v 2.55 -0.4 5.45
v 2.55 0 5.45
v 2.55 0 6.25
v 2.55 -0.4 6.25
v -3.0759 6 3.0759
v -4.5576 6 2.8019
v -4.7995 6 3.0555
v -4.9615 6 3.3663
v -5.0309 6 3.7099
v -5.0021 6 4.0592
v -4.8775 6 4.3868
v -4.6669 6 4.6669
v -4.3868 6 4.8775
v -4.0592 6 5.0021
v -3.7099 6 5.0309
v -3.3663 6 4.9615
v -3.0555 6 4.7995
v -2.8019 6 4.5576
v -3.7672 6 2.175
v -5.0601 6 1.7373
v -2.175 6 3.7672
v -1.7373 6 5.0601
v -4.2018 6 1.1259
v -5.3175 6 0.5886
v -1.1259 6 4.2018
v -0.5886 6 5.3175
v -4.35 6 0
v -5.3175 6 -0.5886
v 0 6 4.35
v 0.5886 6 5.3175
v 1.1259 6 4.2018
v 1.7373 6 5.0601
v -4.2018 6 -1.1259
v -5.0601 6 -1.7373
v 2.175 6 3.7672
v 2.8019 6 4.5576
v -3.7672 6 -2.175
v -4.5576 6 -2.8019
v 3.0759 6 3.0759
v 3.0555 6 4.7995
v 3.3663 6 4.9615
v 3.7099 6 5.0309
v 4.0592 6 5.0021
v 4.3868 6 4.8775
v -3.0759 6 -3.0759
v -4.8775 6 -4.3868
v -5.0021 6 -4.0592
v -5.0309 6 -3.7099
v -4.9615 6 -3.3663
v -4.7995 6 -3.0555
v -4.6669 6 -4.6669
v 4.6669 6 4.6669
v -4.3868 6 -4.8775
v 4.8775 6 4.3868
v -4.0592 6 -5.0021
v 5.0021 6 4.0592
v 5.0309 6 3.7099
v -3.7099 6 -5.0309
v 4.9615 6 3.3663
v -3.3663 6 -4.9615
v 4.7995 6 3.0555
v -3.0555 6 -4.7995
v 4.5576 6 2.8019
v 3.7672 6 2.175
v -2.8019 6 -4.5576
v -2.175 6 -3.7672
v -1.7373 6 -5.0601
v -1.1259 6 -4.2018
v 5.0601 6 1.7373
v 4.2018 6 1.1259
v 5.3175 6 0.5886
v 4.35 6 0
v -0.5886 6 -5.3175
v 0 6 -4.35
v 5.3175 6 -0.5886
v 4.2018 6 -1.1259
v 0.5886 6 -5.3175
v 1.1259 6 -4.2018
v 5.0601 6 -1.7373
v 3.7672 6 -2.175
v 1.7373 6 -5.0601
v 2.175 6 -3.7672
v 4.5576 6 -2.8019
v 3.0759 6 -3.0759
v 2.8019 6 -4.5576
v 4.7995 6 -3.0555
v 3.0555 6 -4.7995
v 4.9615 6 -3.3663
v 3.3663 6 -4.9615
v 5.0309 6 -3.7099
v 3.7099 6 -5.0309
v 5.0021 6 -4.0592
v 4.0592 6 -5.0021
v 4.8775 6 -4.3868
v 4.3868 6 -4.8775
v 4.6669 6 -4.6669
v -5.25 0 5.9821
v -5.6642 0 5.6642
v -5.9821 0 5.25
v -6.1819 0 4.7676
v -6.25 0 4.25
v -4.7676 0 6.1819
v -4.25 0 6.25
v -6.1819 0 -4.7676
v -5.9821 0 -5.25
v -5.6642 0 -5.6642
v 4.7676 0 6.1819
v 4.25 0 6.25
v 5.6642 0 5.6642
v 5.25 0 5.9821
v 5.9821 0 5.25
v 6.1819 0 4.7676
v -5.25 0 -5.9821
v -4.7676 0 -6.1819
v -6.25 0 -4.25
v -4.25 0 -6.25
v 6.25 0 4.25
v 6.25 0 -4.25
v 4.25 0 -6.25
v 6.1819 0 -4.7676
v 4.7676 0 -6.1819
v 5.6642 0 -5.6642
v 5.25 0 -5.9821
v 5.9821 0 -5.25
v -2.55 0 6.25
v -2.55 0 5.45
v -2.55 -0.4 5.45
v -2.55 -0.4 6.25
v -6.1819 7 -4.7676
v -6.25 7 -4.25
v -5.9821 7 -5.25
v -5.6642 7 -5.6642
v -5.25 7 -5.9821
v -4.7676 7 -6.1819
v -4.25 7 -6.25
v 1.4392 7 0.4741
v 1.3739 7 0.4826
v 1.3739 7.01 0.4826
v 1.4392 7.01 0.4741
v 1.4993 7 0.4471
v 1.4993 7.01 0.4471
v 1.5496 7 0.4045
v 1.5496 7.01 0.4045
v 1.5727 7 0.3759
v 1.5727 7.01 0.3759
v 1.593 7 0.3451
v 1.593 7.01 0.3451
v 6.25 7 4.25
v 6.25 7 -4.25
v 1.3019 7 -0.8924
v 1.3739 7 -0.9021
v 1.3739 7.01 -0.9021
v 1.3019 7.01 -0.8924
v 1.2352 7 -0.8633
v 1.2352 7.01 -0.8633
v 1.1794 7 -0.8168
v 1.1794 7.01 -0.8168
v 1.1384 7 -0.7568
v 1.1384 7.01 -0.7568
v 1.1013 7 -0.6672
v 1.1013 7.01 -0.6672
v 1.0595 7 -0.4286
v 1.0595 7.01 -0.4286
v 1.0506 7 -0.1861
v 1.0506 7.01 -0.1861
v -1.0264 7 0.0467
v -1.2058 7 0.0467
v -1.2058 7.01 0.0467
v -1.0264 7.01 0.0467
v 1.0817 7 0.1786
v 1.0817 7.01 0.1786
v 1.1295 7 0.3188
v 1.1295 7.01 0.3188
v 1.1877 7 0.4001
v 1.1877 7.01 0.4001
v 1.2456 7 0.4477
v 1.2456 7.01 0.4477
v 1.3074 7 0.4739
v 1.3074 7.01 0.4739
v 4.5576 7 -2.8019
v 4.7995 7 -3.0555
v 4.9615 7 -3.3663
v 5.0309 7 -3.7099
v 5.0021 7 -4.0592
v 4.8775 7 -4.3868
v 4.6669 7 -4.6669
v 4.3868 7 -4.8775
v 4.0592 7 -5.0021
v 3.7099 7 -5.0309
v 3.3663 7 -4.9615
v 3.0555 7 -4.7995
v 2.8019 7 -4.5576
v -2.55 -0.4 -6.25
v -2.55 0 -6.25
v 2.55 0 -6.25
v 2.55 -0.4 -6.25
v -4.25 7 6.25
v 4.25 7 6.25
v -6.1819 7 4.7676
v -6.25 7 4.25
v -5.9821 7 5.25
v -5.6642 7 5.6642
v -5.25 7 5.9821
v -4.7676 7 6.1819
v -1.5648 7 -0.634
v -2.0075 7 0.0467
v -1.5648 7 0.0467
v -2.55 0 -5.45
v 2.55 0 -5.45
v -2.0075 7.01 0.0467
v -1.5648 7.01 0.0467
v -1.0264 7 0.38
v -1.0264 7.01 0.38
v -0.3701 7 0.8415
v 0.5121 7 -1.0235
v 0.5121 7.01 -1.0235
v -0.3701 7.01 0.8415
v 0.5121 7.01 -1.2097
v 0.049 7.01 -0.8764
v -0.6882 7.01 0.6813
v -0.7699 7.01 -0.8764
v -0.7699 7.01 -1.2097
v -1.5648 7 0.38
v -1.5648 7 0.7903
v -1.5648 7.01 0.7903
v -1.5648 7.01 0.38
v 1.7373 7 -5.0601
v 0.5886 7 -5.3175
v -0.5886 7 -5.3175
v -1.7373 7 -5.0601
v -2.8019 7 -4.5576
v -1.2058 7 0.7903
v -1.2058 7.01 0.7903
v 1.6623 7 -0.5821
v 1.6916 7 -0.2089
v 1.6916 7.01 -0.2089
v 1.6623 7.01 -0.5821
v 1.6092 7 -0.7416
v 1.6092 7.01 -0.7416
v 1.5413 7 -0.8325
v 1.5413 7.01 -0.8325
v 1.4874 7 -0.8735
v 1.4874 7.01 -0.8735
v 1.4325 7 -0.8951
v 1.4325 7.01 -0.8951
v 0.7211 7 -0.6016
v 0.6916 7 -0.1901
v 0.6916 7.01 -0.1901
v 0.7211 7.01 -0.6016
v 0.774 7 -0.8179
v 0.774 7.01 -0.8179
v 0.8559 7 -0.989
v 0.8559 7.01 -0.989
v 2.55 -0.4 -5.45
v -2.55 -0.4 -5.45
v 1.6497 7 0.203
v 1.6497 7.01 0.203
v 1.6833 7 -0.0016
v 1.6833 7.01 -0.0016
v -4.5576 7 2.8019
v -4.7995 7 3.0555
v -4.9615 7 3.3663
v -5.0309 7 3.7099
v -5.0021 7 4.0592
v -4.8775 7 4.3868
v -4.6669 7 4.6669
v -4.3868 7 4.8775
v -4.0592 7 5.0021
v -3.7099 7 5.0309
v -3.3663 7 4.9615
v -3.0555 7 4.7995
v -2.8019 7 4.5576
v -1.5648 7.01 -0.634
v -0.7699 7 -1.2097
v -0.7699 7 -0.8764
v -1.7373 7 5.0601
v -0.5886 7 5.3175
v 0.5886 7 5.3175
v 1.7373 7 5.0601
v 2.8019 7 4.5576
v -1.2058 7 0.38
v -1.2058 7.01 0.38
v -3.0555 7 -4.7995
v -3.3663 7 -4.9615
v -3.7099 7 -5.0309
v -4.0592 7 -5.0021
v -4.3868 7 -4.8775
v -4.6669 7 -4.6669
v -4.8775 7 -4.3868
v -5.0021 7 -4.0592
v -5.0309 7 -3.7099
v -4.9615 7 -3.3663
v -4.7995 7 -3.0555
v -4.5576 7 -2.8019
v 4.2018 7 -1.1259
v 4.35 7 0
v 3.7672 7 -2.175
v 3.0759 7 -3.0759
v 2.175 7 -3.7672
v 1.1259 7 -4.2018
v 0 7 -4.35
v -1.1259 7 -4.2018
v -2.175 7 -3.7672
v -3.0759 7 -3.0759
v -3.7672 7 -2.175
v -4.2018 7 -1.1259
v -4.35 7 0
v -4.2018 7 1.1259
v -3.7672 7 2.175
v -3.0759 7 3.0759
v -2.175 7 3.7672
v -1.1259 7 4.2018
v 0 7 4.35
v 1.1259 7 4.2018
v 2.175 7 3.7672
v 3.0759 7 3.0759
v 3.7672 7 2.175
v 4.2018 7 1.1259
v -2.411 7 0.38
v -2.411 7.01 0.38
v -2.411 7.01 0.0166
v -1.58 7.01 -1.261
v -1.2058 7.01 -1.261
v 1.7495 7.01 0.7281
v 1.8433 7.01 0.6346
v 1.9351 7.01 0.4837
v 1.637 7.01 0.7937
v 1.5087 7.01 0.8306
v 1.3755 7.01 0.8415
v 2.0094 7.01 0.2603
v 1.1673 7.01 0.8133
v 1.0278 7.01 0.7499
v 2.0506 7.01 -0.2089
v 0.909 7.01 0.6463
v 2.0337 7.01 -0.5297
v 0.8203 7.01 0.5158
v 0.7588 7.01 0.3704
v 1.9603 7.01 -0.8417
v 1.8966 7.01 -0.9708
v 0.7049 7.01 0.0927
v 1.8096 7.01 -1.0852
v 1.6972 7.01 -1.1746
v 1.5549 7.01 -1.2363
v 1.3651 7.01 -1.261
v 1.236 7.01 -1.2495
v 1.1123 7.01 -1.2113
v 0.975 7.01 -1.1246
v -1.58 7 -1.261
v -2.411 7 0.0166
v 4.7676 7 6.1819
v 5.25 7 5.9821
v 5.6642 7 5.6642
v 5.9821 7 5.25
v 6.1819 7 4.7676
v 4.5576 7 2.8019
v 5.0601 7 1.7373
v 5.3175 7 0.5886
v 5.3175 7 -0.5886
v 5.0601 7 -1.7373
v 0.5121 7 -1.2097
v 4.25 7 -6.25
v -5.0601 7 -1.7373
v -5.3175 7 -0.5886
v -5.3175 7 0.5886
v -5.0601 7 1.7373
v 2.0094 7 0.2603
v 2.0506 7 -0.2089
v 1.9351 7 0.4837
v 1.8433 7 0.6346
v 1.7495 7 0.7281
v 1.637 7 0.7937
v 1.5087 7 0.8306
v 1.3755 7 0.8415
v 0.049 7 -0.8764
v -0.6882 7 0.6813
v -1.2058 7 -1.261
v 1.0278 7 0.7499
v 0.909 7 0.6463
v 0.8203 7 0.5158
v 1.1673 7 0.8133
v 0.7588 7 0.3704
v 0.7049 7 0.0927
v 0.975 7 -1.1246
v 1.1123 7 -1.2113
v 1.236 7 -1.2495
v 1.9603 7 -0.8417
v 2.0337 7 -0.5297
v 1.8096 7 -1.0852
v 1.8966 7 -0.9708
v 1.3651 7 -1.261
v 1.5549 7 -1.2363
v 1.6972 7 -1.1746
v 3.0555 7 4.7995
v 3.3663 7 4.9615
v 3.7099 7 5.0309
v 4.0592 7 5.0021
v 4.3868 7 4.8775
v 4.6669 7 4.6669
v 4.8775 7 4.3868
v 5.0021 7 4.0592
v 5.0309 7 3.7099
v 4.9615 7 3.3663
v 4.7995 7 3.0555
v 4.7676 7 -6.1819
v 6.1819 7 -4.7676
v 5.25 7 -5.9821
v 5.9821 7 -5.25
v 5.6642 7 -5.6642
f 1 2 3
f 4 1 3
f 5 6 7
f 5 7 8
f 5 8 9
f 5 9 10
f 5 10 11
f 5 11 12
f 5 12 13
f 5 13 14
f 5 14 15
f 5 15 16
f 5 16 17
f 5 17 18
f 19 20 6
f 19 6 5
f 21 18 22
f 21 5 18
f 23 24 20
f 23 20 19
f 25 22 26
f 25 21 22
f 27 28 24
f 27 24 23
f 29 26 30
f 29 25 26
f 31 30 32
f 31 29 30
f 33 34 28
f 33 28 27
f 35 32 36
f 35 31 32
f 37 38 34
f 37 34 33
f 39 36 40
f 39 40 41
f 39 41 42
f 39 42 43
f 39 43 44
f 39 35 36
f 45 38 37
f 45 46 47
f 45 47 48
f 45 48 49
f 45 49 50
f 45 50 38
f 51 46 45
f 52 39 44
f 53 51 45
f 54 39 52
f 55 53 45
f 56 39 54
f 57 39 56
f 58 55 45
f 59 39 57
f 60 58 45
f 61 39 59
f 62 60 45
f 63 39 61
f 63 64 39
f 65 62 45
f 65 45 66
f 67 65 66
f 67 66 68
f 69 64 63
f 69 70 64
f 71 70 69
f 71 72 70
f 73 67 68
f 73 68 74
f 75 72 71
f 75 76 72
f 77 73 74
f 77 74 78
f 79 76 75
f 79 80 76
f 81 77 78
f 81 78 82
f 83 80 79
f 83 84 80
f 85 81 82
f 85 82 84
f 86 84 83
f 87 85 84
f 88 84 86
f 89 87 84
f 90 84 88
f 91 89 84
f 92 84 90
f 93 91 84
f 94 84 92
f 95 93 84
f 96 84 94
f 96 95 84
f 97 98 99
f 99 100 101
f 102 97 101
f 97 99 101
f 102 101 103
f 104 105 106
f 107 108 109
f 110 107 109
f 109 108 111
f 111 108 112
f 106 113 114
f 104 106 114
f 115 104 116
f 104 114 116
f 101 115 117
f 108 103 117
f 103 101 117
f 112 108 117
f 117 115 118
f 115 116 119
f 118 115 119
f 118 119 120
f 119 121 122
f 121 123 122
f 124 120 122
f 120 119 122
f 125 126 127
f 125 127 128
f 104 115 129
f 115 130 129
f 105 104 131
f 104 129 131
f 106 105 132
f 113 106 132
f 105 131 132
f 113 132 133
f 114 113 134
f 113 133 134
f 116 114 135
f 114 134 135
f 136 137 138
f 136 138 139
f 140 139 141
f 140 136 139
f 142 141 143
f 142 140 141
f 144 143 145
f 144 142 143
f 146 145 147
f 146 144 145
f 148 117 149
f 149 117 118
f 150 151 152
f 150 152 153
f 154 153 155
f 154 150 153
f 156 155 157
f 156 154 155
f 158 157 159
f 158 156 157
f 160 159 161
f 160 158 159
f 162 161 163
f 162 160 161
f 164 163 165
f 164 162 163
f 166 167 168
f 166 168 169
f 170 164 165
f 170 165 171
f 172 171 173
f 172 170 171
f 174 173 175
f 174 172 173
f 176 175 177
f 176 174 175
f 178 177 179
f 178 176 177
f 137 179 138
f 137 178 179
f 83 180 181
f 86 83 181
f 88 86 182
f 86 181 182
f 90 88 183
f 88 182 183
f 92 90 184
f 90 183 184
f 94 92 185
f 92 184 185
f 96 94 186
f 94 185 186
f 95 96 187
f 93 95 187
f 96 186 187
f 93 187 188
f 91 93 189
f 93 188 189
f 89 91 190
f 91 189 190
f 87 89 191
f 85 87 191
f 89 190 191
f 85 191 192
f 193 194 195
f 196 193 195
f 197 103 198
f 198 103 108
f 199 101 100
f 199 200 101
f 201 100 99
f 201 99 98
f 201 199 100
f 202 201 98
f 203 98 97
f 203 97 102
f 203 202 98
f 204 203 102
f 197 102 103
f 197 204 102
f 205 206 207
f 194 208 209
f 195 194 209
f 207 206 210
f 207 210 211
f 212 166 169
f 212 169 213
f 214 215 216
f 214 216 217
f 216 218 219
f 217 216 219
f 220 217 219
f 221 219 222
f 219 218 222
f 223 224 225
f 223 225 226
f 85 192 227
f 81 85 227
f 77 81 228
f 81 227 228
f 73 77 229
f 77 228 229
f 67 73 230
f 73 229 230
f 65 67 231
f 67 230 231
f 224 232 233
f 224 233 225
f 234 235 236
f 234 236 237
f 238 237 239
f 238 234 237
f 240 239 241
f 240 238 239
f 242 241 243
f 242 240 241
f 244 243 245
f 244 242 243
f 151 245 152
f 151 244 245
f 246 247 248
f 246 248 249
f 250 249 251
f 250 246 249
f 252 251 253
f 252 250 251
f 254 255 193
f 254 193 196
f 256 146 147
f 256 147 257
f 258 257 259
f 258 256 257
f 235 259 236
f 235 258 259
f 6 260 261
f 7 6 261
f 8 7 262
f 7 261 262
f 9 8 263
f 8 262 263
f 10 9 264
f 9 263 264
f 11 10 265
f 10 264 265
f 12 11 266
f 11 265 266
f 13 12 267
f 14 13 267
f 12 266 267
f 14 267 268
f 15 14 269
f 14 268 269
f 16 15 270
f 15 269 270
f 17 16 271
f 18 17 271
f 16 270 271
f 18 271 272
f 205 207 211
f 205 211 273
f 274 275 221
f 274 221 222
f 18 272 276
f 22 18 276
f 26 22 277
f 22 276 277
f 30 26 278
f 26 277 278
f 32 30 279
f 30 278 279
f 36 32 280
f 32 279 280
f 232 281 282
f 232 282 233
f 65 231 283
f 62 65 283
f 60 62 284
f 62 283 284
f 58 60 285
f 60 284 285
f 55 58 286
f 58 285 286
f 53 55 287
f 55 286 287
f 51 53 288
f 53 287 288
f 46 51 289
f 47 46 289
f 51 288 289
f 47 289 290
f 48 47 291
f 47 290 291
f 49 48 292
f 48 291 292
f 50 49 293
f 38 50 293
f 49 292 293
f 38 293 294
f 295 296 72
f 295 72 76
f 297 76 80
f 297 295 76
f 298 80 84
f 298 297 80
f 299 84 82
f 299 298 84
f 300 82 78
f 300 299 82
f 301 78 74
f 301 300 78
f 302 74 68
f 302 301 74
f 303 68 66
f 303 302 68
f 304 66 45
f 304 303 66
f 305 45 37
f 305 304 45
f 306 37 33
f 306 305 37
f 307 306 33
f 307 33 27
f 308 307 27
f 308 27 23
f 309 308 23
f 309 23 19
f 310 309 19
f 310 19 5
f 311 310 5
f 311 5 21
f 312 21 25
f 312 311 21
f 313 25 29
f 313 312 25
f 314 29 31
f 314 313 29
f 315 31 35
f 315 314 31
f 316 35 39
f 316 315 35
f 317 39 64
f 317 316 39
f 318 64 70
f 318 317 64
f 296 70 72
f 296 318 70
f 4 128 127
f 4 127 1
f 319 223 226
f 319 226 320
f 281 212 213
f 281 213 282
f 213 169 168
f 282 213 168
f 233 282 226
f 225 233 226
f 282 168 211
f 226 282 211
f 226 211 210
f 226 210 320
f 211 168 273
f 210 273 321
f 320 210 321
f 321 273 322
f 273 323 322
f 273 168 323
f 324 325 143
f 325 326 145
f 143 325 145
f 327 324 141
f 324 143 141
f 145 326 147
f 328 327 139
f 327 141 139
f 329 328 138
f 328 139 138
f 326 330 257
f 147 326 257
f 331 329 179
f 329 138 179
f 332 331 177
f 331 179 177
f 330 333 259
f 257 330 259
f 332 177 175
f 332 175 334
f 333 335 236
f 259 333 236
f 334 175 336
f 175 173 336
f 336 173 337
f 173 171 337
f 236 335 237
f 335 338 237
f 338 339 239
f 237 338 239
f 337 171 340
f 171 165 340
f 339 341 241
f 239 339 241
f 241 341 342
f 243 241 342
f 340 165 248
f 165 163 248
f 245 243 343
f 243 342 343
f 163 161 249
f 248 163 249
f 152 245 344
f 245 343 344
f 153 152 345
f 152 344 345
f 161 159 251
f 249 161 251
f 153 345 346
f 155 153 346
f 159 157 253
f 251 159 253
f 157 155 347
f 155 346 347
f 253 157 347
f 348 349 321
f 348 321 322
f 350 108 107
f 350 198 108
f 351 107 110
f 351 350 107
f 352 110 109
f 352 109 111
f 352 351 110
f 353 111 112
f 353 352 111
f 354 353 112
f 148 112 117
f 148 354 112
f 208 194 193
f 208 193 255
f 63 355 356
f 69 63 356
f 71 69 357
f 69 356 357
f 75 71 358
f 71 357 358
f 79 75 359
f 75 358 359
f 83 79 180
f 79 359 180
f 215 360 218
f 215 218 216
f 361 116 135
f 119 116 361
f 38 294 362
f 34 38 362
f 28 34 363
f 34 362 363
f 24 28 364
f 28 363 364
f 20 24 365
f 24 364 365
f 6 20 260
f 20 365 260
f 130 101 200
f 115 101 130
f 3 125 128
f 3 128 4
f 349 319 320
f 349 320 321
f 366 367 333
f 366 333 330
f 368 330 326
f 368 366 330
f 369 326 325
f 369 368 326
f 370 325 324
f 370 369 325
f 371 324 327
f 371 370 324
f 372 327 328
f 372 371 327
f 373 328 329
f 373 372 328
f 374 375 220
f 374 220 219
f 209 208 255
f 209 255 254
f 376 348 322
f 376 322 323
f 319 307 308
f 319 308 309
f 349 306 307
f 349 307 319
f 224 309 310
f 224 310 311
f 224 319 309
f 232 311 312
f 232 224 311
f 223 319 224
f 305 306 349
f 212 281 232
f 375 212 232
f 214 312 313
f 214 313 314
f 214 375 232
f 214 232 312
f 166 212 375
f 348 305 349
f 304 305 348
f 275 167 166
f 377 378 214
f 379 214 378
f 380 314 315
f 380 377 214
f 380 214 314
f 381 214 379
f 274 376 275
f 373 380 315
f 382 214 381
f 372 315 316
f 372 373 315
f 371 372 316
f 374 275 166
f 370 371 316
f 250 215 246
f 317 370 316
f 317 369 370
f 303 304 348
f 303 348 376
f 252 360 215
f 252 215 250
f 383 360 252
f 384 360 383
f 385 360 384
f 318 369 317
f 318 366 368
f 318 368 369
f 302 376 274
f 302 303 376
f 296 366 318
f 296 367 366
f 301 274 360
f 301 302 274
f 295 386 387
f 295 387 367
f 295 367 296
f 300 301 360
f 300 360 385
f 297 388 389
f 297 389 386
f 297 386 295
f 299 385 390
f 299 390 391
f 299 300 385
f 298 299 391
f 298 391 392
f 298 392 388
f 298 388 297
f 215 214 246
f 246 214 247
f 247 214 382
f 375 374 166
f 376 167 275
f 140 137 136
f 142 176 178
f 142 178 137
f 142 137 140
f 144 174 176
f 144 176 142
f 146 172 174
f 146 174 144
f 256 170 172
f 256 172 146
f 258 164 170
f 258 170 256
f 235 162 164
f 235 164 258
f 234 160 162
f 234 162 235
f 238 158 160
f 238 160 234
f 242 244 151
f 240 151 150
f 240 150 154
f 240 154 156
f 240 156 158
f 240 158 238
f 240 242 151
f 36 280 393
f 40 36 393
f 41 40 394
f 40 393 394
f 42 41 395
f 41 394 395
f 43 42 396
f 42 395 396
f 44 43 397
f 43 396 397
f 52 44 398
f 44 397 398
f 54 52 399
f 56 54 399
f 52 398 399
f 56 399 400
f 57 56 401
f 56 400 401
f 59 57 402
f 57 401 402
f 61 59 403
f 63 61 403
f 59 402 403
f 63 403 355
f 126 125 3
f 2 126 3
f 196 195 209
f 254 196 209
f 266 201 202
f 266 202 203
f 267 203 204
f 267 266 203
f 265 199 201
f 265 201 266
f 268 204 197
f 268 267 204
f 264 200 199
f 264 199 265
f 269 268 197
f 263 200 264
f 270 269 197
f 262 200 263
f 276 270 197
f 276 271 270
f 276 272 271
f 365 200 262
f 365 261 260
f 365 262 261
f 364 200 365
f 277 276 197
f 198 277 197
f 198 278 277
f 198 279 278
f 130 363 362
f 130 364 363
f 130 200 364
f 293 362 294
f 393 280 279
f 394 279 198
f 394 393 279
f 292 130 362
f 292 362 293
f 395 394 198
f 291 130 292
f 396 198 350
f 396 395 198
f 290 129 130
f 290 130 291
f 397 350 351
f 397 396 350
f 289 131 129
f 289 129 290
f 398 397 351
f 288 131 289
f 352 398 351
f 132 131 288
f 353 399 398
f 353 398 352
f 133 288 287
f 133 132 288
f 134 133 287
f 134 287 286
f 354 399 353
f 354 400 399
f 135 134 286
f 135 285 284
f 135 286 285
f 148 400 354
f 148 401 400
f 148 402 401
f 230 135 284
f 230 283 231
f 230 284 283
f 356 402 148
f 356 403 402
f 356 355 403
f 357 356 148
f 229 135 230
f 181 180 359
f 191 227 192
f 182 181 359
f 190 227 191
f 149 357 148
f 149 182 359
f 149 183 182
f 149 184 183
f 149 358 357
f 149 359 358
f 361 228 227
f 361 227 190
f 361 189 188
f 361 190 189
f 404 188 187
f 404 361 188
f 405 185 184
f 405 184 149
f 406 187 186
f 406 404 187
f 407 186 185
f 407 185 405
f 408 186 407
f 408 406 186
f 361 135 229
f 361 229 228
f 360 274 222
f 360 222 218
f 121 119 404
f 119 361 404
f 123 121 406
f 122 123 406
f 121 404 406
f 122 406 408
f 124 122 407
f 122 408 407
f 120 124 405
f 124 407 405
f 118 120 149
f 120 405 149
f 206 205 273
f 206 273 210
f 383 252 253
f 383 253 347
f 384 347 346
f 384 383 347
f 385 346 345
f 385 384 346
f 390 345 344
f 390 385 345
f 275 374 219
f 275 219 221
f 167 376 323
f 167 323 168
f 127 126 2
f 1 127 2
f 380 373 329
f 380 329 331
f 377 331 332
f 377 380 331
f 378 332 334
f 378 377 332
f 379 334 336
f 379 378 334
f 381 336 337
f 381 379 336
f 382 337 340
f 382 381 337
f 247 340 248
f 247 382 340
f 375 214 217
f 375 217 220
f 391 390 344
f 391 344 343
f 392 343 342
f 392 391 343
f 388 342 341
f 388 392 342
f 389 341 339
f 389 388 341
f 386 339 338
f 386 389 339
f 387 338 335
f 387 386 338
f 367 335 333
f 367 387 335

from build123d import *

# Parameters (mm, degrees)
SKETCH1_W             = 12.5
SKETCH1_H             = 12.5
BOSS_EXTRUDE1_DEPTH   = 7
SKETCH2_R             = 4.35
CUT_EXTRUDE1_DEPTH    = 1
SKETCH3_W             = 5.1
SKETCH3_H             = 0.8
BOSS_EXTRUDE2_DEPTH   = 0.4
BOSS_EXTRUDE2_2_DEPTH = 0.4
BOSS_EXTRUDE3_DEPTH   = 0.01
FILLET1_R             = 2


with BuildPart() as part:
    # Sketch1 → Boss-Extrude1 (new body)
    with BuildSketch(Plane(origin=(0, 0, 0), x_dir=(1, 0, 0), z_dir=(0, 1, 0))):
        Rectangle(SKETCH1_W, SKETCH1_H)
    extrude(amount=BOSS_EXTRUDE1_DEPTH)

    # Sketch2 → Cut-Extrude1 (cut)
    with BuildSketch(Plane(origin=(0, 7, 0), x_dir=(1, 0, 0), z_dir=(0, 1, 0))):
        with BuildLine():
            ThreePointArc((-4.557595229, 2.801932498), (-5.35, 0), (-4.557595229, -2.801932498))
            ThreePointArc((-4.557595229, -2.801932498), (-4.666904756, -4.666904756), (-2.801932498, -4.557595229))
            ThreePointArc((-2.801932498, -4.557595229), (0, -5.35), (2.801932498, -4.557595229))
            ThreePointArc((2.801932498, -4.557595229), (4.666904756, -4.666904756), (4.557595229, -2.801932498))
            ThreePointArc((4.557595229, -2.801932498), (5.35, 0), (4.557595229, 2.801932498))
            ThreePointArc((4.557595229, 2.801932498), (4.666904756, 4.666904756), (2.801932498, 4.557595229))
            ThreePointArc((2.801932498, 4.557595229), (0, 5.35), (-2.801932498, 4.557595229))
            ThreePointArc((-2.801932498, 4.557595229), (-4.666904756, 4.666904756), (-4.557595229, 2.801932498))
        make_face()
        Circle(SKETCH2_R, mode=Mode.SUBTRACT)
    extrude(amount=-CUT_EXTRUDE1_DEPTH, mode=Mode.SUBTRACT)

    # Sketch4 → Boss-Extrude3 (add)
    with BuildSketch(Plane(origin=(0, 7, 0), x_dir=(1, 0, 0), z_dir=(0, 1, 0))):
        Polygon((-1.580043076, 1.261031415), (-1.205844358, 1.261031415), (-1.205844358, -0.046660893), (-1.026357178, -0.046660893), (-1.026357178, -0.379994226), (-1.205844358, -0.379994226), (-1.205844358, -0.790250636), (-1.564818717, -0.790250636), (-1.564818717, -0.379994226), (-2.410972563, -0.379994226), (-2.410972563, -0.016612816), align=None)
        Polygon((-1.564818717, -0.046660893), (-1.564818717, 0.63402821), (-2.00752705, -0.046660893), align=None, mode=Mode.SUBTRACT)
        Polygon((-0.769946922, 1.209749364), (0.51210436, 1.209749364), (0.51210436, 1.023451287), (-0.370107178, -0.841532688), (-0.688216153, -0.681276277), (0.048963335, 0.87641603), (-0.769946922, 0.87641603), align=None)
        with BuildLine():
            add(Edge.make_bspline(
                [(1.365069104, 1.261031415), (1.382444953, 1.260773466), (1.416610514, 1.260266268), (1.466929955, 1.254772907), (1.515401489, 1.246473971), (1.562214743, 1.234899849), (1.60703275, 1.219581911), (1.650181705, 1.201246601), (1.69114801, 1.178932195), (1.730454117, 1.153726928), (1.768084886, 1.125190993), (1.803135886, 1.092658553), (1.836247224, 1.056878181), (1.866702161, 1.017308943), (1.895175131, 0.974310762), (1.921572577, 0.927876821), (1.945692419, 0.877779856), (1.967804983, 0.823929463), (1.987578108, 0.765518449), (2.004232987, 0.701876813), (2.018517333, 0.632990023), (2.030574328, 0.558686607), (2.039687468, 0.4788678), (2.045829907, 0.393586629), (2.05004514, 0.303007503), (2.050389158, 0.240870967), (2.050565899, 0.208948082)],
                knots=[0, 0, 0, 0, 5.2108e-05, 0.000102458, 0.00015166, 0.000199565, 0.000246949, 0.000293612, 0.000340039, 0.000386715, 0.000433592, 0.00048151, 0.000529994, 0.00057968, 0.000631128, 0.000684598, 0.000739788, 0.00079782, 0.00085914, 0.00092464, 0.000995043, 0.00107013, 0.001150388, 0.001235965, 0.001326599, 0.001422359, 0.001422359, 0.001422359, 0.001422359], degree=3))
            add(Edge.make_bspline(
                [(2.050565899, 0.208948082), (2.05037489, 0.176625805), (2.050003763, 0.113824201), (2.046005136, 0.022416592), (2.03911931, -0.063483771), (2.030244362, -0.143868003), (2.018088109, -0.218693654), (2.003851448, -0.288154471), (1.986933677, -0.352225278), (1.966509232, -0.410761708), (1.944530515, -0.464706674), (1.920344695, -0.514705961), (1.894373327, -0.560894997), (1.867212115, -0.603970605), (1.837371983, -0.642662938), (1.806305333, -0.678287739), (1.772659469, -0.709488012), (1.737851011, -0.737871679), (1.700604784, -0.762400864), (1.6613049, -0.783853685), (1.619250709, -0.80125447), (1.575208788, -0.816388744), (1.528428433, -0.827253519), (1.479652978, -0.835874362), (1.428331758, -0.840638768), (1.393390204, -0.841229824), (1.37548577, -0.841532688)],
                knots=[0, 0, 0, 0, 9.6963e-05, 0.000188397, 0.000274404, 0.000355458, 0.00043094, 0.000501736, 0.000568113, 0.000629563, 0.000687595, 0.000742785, 0.000796058, 0.000846513, 0.000895393, 0.000942506, 0.000988138, 0.001032876, 0.001077101, 0.001121738, 0.00116698, 0.001213477, 0.001261286, 0.001310883, 0.001361991, 0.001415701, 0.001415701, 0.001415701, 0.001415701], degree=3))
            add(Edge.make_bspline(
                [(1.37548577, -0.841532688), (1.35758182, -0.841223982), (1.322508245, -0.840619232), (1.271048247, -0.835909787), (1.222014307, -0.827218596), (1.174863844, -0.816305332), (1.129925019, -0.801287956), (1.086982352, -0.783366552), (1.046366033, -0.762047586), (1.007963604, -0.73746125), (0.971906181, -0.709267491), (0.937633432, -0.677767872), (0.905221169, -0.643042236), (0.875162465, -0.604701628), (0.846965044, -0.563257814), (0.820922961, -0.518237527), (0.797051866, -0.469706315), (0.774605068, -0.417596531), (0.755101642, -0.36078631), (0.737744498, -0.298768345), (0.723525982, -0.231025665), (0.7120905, -0.157580032), (0.702960418, -0.078587045), (0.696168686, 0.005991424), (0.692147848, 0.09619477), (0.691780614, 0.158196023), (0.69159154, 0.190117953)],
                knots=[0, 0, 0, 0, 5.371e-05, 0.000105217, 0.000154814, 0.000203012, 0.000250269, 0.000296775, 0.000342472, 0.000387704, 0.000433384, 0.000479604, 0.000527228, 0.000575721, 0.000625614, 0.000677496, 0.000731606, 0.00078779, 0.000847594, 0.000911653, 0.00098088, 0.001055113, 0.001134575, 0.001219384, 0.001309617, 0.001405378, 0.001405378, 0.001405378, 0.001405378], degree=3))
            add(Edge.make_bspline(
                [(0.69159154, 0.190117953), (0.69193403, 0.234470962), (0.692594869, 0.320050664), (0.700969509, 0.443688451), (0.713261357, 0.557970167), (0.73131517, 0.662704649), (0.753638459, 0.758279801), (0.782224594, 0.844066025), (0.814767829, 0.921250365), (0.842498846, 0.966974833), (0.85585436, 0.988996159)],
                knots=[0, 0, 0, 0, 0.000133035, 0.000256692, 0.000371592, 0.000477702, 0.000575362, 0.000665694, 0.000748763, 0.000825937, 0.000825937, 0.000825937, 0.000825937], degree=3))
            add(Edge.make_bspline(
                [(0.85585436, 0.988996159), (0.871383516, 1.010629902), (0.901746074, 1.052928134), (0.954835857, 1.108457806), (1.011873916, 1.1559495), (1.074031782, 1.194328438), (1.1403264, 1.224594071), (1.211326945, 1.245970347), (1.286771223, 1.258425162), (1.338580067, 1.260149691), (1.365069104, 1.261031415)],
                knots=[0, 0, 0, 0, 7.9808e-05, 0.00015604, 0.000229755, 0.000301908, 0.000374523, 0.00044778, 0.000523722, 0.000603172, 0.000603172, 0.000603172, 0.000603172], degree=3))
        make_face()
        with BuildLine():
            add(Edge.make_bspline(
                [(1.373883206, 0.902057056), (1.358175295, 0.901312532), (1.32737945, 0.89985287), (1.282693212, 0.887462401), (1.24055688, 0.868324653), (1.208504897, 0.845295365), (1.184514307, 0.823219031), (1.167751909, 0.803240667), (1.151587219, 0.780946252), (1.13730975, 0.755329755), (1.123828093, 0.727311606), (1.11065245, 0.69676462), (1.099851883, 0.662938496), (1.089240611, 0.626409298), (1.079944148, 0.586167091), (1.072155749, 0.541882939), (1.0651975, 0.493268857), (1.060344038, 0.440293005), (1.055819155, 0.383010807), (1.052575504, 0.321294661), (1.051219416, 0.255161217), (1.050788356, 0.209616096), (1.050565899, 0.186111543)],
                knots=[0, 0, 0, 0, 4.7046e-05, 9.2235e-05, 0.000138125, 0.000185258, 0.00020992, 0.000235776, 0.000263347, 0.000292418, 0.000323596, 0.000356634, 0.000392108, 0.000430025, 0.000470745, 0.000515932, 0.000564886, 0.000618026, 0.000675487, 0.000737269, 0.000803394, 0.000873912, 0.000873912, 0.000873912, 0.000873912], degree=3))
            add(Edge.make_bspline(
                [(1.050565899, 0.186111543), (1.050932037, 0.155660259), (1.051634134, 0.097267664), (1.055311391, 0.01329708), (1.062682146, -0.063122914), (1.071849878, -0.132510242), (1.084726332, -0.194414911), (1.099541526, -0.249422596), (1.117836973, -0.296832082), (1.138980887, -0.337329017), (1.162398725, -0.371779676), (1.187819818, -0.40106289), (1.214378669, -0.426420773), (1.242904267, -0.447018668), (1.273328557, -0.462803946), (1.305397553, -0.474158101), (1.339131634, -0.481108452), (1.362232385, -0.482072243), (1.373883206, -0.482558329)],
                knots=[0, 0, 0, 0, 9.136e-05, 0.00017519, 0.000252051, 0.000321629, 0.000385038, 0.000441612, 0.000492353, 0.000537155, 0.000578382, 0.000617015, 0.000653294, 0.000688318, 0.000722185, 0.000755765, 0.000790101, 0.00082504, 0.00082504, 0.00082504, 0.00082504], degree=3))
            add(Edge.make_bspline(
                [(1.373883206, -0.482558329), (1.385134208, -0.482225713), (1.407162271, -0.481574492), (1.43928412, -0.474889797), (1.469660823, -0.464021935), (1.498200663, -0.448648582), (1.525005723, -0.429099011), (1.549944996, -0.405287313), (1.572830397, -0.376976142), (1.586163535, -0.355965065), (1.593033847, -0.345138457)],
                knots=[0, 0, 0, 0, 3.3713e-05, 6.6007e-05, 9.7943e-05, 0.000130206, 0.000162902, 0.000197191, 0.000233358, 0.000271805, 0.000271805, 0.000271805, 0.000271805], degree=3))
            add(Edge.make_bspline(
                [(1.593033847, -0.345138457), (1.601122483, -0.330344242), (1.618083697, -0.299321975), (1.637711243, -0.246973055), (1.654232618, -0.187932125), (1.668452323, -0.122015445), (1.678177734, -0.048963031), (1.686553246, 0.030761886), (1.690592963, 0.117560768), (1.691250045, 0.177695347), (1.69159154, 0.208948082)],
                knots=[0, 0, 0, 0, 5.0532e-05, 0.000105961, 0.000167212, 0.000234396, 0.000308053, 0.000388183, 0.000474833, 0.000568597, 0.000568597, 0.000568597, 0.000568597], degree=3))
            add(Edge.make_bspline(
                [(1.69159154, 0.208948082), (1.691459628, 0.240472105), (1.69120572, 0.30115047), (1.686547248, 0.3882614), (1.680059969, 0.467822777), (1.670570952, 0.539656973), (1.658361608, 0.60393837), (1.643313545, 0.660662766), (1.625572998, 0.709941954), (1.604534824, 0.751726795), (1.581233739, 0.787238178), (1.556498926, 0.817704191), (1.530225796, 0.843715303), (1.502458286, 0.865369401), (1.472553708, 0.881914755), (1.441083278, 0.893597144), (1.40798248, 0.900664598), (1.385403049, 0.901586638), (1.373883206, 0.902057056)],
                knots=[0, 0, 0, 0, 9.4559e-05, 0.00018201, 0.000261629, 0.000333985, 0.00039928, 0.000457786, 0.000509883, 0.00055611, 0.00059778, 0.000637076, 0.000673622, 0.00070848, 0.000742374, 0.000775714, 0.000808873, 0.000843412, 0.000843412, 0.000843412, 0.000843412], degree=3))
        make_face(mode=Mode.SUBTRACT)
    extrude(amount=BOSS_EXTRUDE3_DEPTH)

    # Fillet1
    fillet1_edges = [part.edges().sort_by_distance(p)[0] for p in [
        (6.25, 3.5, 6.25),
        (-6.25, 3.5, 6.25),
        (-6.25, 3.5, -6.25),
        (6.25, 3.5, -6.25),
    ]]
    fillet(fillet1_edges, radius=FILLET1_R)


with BuildPart() as body_2:
    # Sketch3 → Boss-Extrude2 (new body)
    with BuildSketch(Plane.XZ):
        with Locations((0, 5.85)):
            Rectangle(SKETCH3_W, SKETCH3_H)
    extrude(amount=BOSS_EXTRUDE2_DEPTH)


with BuildPart() as body_3:
    # Sketch3 → Boss-Extrude2 2 (new body)
    with BuildSketch(Plane.XZ):
        with Locations((0, -5.85)):
            Rectangle(SKETCH3_W, SKETCH3_H)
    extrude(amount=BOSS_EXTRUDE2_2_DEPTH)


solid = Compound([part.part, body_2.part, body_3.part])
